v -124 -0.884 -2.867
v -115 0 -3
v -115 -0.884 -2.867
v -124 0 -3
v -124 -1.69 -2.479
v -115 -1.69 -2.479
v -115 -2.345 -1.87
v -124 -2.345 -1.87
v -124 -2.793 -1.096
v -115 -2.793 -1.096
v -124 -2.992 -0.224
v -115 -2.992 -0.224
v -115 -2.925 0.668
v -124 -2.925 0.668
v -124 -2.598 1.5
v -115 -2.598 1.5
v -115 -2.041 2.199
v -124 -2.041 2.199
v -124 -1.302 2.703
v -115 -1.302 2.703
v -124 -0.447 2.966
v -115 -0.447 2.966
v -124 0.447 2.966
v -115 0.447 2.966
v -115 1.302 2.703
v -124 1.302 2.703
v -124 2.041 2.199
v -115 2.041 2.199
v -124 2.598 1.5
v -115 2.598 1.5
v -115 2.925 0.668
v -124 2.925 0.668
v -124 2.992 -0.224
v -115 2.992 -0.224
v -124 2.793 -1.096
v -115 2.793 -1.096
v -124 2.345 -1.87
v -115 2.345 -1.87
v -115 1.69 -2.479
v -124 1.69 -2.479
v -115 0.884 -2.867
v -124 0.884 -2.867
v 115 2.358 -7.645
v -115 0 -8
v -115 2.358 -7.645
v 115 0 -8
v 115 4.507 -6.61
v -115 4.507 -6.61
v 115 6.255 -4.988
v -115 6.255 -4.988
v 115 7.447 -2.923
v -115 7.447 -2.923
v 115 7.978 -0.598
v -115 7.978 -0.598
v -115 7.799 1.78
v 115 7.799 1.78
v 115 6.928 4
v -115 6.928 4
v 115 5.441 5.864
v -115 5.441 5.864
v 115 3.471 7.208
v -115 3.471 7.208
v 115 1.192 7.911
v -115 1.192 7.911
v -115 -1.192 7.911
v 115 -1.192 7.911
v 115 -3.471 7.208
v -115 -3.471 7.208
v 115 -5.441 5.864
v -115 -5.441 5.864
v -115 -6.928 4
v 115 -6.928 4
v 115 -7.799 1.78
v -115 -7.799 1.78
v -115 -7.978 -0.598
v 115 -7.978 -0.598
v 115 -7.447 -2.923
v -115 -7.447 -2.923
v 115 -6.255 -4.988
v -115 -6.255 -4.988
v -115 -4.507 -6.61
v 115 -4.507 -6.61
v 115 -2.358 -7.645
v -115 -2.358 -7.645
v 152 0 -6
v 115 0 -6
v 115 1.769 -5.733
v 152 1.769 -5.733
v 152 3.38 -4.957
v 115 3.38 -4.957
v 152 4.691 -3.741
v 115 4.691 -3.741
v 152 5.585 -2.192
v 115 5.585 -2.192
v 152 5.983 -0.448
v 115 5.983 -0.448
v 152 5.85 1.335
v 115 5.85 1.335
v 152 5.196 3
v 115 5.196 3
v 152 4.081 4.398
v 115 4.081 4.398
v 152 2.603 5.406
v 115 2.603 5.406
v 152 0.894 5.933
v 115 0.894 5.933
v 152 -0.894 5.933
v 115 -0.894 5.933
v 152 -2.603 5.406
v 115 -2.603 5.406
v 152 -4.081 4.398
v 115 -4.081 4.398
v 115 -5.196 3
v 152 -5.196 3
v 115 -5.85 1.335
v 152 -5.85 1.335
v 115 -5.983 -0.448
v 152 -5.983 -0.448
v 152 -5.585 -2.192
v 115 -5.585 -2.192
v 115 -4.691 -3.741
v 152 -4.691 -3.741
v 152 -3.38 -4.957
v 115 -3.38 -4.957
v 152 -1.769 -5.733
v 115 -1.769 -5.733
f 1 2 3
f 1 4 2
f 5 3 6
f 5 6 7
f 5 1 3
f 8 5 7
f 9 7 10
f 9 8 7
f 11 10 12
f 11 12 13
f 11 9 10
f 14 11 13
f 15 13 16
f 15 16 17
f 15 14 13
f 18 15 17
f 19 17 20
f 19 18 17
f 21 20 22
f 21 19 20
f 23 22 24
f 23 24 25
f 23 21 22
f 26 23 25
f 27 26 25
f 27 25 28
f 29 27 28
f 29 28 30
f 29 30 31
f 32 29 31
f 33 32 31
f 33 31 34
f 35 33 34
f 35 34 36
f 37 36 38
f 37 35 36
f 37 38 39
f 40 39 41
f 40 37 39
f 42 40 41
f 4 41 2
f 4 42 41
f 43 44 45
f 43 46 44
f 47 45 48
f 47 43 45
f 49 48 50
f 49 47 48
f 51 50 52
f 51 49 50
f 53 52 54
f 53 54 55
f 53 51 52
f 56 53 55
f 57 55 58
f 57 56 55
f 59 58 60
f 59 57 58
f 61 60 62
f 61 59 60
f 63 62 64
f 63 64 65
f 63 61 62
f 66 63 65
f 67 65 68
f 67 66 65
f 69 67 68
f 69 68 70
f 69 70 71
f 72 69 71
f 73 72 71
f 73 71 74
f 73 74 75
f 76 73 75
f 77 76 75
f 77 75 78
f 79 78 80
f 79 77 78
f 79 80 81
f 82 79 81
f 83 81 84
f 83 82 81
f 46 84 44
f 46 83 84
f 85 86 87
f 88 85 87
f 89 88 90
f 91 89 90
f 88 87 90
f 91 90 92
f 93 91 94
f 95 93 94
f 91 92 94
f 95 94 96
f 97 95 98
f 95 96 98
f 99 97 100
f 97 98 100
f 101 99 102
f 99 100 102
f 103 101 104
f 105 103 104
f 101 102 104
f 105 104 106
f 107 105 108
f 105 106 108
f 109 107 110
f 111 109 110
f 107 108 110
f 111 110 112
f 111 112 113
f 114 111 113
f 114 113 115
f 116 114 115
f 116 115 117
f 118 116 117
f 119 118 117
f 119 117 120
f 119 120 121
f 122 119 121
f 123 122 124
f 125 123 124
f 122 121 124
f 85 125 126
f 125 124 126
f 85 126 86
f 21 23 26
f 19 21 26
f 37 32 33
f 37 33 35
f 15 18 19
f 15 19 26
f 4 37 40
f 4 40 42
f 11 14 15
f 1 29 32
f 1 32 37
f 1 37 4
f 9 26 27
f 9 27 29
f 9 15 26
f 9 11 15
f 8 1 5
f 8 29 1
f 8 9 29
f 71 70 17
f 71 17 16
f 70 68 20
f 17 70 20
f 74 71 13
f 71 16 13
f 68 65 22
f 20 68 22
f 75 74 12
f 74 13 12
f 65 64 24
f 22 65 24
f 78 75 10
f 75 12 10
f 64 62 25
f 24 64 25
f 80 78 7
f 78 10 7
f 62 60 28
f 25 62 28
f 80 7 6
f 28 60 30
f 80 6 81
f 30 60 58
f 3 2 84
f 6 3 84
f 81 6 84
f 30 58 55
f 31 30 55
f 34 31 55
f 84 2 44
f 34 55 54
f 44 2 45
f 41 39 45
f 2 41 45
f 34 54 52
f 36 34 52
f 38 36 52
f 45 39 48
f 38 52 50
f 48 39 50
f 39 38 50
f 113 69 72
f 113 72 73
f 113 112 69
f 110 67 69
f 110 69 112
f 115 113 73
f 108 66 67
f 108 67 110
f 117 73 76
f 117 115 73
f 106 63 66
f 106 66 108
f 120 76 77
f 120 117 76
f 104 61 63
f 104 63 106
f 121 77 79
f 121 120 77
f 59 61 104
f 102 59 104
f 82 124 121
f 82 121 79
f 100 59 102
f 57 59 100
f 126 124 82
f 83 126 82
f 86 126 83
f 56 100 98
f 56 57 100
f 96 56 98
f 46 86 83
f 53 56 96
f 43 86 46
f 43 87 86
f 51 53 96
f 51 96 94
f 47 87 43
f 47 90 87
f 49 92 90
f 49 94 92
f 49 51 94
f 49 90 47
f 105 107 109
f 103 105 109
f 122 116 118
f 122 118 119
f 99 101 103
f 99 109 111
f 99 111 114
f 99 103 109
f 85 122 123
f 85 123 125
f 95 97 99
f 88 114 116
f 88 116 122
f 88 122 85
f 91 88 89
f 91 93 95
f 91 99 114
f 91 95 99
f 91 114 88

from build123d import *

# Parameters (mm, degrees)
SKETCH_1_R      = 8
EXTRUDE_1_DEPTH = 115
SKETCH_2_R      = 6
EXTRUDE_2_DEPTH = 37
SKETCH_5_R      = 3
EXTRUDE_4_DEPTH = 9


with BuildPart() as part:
    # 草图1 → 凸台-拉伸1 (new, symmetric)
    with BuildSketch(Plane(origin=(0, 0, 0), x_dir=(0, 0, -1), z_dir=(1, 0, 0))):
        Circle(SKETCH_1_R)
    extrude(amount=EXTRUDE_1_DEPTH, both=True)

    # 草图2 → 凸台-拉伸2 (add)
    with BuildSketch(Plane(origin=(115, 0, 0), x_dir=(0, 0, -1), z_dir=(1, 0, 0))):
        Circle(SKETCH_2_R)
    extrude(amount=EXTRUDE_2_DEPTH)

    # 草图5 → 凸台-拉伸4 (add, symmetric)
    with BuildSketch(Plane.ZY.offset(115)):
        with Locations(Location((0, 0, 0), (0, 0, 180))):
            Circle(SKETCH_5_R)
    extrude(amount=EXTRUDE_4_DEPTH, both=True)


solid = part.part
